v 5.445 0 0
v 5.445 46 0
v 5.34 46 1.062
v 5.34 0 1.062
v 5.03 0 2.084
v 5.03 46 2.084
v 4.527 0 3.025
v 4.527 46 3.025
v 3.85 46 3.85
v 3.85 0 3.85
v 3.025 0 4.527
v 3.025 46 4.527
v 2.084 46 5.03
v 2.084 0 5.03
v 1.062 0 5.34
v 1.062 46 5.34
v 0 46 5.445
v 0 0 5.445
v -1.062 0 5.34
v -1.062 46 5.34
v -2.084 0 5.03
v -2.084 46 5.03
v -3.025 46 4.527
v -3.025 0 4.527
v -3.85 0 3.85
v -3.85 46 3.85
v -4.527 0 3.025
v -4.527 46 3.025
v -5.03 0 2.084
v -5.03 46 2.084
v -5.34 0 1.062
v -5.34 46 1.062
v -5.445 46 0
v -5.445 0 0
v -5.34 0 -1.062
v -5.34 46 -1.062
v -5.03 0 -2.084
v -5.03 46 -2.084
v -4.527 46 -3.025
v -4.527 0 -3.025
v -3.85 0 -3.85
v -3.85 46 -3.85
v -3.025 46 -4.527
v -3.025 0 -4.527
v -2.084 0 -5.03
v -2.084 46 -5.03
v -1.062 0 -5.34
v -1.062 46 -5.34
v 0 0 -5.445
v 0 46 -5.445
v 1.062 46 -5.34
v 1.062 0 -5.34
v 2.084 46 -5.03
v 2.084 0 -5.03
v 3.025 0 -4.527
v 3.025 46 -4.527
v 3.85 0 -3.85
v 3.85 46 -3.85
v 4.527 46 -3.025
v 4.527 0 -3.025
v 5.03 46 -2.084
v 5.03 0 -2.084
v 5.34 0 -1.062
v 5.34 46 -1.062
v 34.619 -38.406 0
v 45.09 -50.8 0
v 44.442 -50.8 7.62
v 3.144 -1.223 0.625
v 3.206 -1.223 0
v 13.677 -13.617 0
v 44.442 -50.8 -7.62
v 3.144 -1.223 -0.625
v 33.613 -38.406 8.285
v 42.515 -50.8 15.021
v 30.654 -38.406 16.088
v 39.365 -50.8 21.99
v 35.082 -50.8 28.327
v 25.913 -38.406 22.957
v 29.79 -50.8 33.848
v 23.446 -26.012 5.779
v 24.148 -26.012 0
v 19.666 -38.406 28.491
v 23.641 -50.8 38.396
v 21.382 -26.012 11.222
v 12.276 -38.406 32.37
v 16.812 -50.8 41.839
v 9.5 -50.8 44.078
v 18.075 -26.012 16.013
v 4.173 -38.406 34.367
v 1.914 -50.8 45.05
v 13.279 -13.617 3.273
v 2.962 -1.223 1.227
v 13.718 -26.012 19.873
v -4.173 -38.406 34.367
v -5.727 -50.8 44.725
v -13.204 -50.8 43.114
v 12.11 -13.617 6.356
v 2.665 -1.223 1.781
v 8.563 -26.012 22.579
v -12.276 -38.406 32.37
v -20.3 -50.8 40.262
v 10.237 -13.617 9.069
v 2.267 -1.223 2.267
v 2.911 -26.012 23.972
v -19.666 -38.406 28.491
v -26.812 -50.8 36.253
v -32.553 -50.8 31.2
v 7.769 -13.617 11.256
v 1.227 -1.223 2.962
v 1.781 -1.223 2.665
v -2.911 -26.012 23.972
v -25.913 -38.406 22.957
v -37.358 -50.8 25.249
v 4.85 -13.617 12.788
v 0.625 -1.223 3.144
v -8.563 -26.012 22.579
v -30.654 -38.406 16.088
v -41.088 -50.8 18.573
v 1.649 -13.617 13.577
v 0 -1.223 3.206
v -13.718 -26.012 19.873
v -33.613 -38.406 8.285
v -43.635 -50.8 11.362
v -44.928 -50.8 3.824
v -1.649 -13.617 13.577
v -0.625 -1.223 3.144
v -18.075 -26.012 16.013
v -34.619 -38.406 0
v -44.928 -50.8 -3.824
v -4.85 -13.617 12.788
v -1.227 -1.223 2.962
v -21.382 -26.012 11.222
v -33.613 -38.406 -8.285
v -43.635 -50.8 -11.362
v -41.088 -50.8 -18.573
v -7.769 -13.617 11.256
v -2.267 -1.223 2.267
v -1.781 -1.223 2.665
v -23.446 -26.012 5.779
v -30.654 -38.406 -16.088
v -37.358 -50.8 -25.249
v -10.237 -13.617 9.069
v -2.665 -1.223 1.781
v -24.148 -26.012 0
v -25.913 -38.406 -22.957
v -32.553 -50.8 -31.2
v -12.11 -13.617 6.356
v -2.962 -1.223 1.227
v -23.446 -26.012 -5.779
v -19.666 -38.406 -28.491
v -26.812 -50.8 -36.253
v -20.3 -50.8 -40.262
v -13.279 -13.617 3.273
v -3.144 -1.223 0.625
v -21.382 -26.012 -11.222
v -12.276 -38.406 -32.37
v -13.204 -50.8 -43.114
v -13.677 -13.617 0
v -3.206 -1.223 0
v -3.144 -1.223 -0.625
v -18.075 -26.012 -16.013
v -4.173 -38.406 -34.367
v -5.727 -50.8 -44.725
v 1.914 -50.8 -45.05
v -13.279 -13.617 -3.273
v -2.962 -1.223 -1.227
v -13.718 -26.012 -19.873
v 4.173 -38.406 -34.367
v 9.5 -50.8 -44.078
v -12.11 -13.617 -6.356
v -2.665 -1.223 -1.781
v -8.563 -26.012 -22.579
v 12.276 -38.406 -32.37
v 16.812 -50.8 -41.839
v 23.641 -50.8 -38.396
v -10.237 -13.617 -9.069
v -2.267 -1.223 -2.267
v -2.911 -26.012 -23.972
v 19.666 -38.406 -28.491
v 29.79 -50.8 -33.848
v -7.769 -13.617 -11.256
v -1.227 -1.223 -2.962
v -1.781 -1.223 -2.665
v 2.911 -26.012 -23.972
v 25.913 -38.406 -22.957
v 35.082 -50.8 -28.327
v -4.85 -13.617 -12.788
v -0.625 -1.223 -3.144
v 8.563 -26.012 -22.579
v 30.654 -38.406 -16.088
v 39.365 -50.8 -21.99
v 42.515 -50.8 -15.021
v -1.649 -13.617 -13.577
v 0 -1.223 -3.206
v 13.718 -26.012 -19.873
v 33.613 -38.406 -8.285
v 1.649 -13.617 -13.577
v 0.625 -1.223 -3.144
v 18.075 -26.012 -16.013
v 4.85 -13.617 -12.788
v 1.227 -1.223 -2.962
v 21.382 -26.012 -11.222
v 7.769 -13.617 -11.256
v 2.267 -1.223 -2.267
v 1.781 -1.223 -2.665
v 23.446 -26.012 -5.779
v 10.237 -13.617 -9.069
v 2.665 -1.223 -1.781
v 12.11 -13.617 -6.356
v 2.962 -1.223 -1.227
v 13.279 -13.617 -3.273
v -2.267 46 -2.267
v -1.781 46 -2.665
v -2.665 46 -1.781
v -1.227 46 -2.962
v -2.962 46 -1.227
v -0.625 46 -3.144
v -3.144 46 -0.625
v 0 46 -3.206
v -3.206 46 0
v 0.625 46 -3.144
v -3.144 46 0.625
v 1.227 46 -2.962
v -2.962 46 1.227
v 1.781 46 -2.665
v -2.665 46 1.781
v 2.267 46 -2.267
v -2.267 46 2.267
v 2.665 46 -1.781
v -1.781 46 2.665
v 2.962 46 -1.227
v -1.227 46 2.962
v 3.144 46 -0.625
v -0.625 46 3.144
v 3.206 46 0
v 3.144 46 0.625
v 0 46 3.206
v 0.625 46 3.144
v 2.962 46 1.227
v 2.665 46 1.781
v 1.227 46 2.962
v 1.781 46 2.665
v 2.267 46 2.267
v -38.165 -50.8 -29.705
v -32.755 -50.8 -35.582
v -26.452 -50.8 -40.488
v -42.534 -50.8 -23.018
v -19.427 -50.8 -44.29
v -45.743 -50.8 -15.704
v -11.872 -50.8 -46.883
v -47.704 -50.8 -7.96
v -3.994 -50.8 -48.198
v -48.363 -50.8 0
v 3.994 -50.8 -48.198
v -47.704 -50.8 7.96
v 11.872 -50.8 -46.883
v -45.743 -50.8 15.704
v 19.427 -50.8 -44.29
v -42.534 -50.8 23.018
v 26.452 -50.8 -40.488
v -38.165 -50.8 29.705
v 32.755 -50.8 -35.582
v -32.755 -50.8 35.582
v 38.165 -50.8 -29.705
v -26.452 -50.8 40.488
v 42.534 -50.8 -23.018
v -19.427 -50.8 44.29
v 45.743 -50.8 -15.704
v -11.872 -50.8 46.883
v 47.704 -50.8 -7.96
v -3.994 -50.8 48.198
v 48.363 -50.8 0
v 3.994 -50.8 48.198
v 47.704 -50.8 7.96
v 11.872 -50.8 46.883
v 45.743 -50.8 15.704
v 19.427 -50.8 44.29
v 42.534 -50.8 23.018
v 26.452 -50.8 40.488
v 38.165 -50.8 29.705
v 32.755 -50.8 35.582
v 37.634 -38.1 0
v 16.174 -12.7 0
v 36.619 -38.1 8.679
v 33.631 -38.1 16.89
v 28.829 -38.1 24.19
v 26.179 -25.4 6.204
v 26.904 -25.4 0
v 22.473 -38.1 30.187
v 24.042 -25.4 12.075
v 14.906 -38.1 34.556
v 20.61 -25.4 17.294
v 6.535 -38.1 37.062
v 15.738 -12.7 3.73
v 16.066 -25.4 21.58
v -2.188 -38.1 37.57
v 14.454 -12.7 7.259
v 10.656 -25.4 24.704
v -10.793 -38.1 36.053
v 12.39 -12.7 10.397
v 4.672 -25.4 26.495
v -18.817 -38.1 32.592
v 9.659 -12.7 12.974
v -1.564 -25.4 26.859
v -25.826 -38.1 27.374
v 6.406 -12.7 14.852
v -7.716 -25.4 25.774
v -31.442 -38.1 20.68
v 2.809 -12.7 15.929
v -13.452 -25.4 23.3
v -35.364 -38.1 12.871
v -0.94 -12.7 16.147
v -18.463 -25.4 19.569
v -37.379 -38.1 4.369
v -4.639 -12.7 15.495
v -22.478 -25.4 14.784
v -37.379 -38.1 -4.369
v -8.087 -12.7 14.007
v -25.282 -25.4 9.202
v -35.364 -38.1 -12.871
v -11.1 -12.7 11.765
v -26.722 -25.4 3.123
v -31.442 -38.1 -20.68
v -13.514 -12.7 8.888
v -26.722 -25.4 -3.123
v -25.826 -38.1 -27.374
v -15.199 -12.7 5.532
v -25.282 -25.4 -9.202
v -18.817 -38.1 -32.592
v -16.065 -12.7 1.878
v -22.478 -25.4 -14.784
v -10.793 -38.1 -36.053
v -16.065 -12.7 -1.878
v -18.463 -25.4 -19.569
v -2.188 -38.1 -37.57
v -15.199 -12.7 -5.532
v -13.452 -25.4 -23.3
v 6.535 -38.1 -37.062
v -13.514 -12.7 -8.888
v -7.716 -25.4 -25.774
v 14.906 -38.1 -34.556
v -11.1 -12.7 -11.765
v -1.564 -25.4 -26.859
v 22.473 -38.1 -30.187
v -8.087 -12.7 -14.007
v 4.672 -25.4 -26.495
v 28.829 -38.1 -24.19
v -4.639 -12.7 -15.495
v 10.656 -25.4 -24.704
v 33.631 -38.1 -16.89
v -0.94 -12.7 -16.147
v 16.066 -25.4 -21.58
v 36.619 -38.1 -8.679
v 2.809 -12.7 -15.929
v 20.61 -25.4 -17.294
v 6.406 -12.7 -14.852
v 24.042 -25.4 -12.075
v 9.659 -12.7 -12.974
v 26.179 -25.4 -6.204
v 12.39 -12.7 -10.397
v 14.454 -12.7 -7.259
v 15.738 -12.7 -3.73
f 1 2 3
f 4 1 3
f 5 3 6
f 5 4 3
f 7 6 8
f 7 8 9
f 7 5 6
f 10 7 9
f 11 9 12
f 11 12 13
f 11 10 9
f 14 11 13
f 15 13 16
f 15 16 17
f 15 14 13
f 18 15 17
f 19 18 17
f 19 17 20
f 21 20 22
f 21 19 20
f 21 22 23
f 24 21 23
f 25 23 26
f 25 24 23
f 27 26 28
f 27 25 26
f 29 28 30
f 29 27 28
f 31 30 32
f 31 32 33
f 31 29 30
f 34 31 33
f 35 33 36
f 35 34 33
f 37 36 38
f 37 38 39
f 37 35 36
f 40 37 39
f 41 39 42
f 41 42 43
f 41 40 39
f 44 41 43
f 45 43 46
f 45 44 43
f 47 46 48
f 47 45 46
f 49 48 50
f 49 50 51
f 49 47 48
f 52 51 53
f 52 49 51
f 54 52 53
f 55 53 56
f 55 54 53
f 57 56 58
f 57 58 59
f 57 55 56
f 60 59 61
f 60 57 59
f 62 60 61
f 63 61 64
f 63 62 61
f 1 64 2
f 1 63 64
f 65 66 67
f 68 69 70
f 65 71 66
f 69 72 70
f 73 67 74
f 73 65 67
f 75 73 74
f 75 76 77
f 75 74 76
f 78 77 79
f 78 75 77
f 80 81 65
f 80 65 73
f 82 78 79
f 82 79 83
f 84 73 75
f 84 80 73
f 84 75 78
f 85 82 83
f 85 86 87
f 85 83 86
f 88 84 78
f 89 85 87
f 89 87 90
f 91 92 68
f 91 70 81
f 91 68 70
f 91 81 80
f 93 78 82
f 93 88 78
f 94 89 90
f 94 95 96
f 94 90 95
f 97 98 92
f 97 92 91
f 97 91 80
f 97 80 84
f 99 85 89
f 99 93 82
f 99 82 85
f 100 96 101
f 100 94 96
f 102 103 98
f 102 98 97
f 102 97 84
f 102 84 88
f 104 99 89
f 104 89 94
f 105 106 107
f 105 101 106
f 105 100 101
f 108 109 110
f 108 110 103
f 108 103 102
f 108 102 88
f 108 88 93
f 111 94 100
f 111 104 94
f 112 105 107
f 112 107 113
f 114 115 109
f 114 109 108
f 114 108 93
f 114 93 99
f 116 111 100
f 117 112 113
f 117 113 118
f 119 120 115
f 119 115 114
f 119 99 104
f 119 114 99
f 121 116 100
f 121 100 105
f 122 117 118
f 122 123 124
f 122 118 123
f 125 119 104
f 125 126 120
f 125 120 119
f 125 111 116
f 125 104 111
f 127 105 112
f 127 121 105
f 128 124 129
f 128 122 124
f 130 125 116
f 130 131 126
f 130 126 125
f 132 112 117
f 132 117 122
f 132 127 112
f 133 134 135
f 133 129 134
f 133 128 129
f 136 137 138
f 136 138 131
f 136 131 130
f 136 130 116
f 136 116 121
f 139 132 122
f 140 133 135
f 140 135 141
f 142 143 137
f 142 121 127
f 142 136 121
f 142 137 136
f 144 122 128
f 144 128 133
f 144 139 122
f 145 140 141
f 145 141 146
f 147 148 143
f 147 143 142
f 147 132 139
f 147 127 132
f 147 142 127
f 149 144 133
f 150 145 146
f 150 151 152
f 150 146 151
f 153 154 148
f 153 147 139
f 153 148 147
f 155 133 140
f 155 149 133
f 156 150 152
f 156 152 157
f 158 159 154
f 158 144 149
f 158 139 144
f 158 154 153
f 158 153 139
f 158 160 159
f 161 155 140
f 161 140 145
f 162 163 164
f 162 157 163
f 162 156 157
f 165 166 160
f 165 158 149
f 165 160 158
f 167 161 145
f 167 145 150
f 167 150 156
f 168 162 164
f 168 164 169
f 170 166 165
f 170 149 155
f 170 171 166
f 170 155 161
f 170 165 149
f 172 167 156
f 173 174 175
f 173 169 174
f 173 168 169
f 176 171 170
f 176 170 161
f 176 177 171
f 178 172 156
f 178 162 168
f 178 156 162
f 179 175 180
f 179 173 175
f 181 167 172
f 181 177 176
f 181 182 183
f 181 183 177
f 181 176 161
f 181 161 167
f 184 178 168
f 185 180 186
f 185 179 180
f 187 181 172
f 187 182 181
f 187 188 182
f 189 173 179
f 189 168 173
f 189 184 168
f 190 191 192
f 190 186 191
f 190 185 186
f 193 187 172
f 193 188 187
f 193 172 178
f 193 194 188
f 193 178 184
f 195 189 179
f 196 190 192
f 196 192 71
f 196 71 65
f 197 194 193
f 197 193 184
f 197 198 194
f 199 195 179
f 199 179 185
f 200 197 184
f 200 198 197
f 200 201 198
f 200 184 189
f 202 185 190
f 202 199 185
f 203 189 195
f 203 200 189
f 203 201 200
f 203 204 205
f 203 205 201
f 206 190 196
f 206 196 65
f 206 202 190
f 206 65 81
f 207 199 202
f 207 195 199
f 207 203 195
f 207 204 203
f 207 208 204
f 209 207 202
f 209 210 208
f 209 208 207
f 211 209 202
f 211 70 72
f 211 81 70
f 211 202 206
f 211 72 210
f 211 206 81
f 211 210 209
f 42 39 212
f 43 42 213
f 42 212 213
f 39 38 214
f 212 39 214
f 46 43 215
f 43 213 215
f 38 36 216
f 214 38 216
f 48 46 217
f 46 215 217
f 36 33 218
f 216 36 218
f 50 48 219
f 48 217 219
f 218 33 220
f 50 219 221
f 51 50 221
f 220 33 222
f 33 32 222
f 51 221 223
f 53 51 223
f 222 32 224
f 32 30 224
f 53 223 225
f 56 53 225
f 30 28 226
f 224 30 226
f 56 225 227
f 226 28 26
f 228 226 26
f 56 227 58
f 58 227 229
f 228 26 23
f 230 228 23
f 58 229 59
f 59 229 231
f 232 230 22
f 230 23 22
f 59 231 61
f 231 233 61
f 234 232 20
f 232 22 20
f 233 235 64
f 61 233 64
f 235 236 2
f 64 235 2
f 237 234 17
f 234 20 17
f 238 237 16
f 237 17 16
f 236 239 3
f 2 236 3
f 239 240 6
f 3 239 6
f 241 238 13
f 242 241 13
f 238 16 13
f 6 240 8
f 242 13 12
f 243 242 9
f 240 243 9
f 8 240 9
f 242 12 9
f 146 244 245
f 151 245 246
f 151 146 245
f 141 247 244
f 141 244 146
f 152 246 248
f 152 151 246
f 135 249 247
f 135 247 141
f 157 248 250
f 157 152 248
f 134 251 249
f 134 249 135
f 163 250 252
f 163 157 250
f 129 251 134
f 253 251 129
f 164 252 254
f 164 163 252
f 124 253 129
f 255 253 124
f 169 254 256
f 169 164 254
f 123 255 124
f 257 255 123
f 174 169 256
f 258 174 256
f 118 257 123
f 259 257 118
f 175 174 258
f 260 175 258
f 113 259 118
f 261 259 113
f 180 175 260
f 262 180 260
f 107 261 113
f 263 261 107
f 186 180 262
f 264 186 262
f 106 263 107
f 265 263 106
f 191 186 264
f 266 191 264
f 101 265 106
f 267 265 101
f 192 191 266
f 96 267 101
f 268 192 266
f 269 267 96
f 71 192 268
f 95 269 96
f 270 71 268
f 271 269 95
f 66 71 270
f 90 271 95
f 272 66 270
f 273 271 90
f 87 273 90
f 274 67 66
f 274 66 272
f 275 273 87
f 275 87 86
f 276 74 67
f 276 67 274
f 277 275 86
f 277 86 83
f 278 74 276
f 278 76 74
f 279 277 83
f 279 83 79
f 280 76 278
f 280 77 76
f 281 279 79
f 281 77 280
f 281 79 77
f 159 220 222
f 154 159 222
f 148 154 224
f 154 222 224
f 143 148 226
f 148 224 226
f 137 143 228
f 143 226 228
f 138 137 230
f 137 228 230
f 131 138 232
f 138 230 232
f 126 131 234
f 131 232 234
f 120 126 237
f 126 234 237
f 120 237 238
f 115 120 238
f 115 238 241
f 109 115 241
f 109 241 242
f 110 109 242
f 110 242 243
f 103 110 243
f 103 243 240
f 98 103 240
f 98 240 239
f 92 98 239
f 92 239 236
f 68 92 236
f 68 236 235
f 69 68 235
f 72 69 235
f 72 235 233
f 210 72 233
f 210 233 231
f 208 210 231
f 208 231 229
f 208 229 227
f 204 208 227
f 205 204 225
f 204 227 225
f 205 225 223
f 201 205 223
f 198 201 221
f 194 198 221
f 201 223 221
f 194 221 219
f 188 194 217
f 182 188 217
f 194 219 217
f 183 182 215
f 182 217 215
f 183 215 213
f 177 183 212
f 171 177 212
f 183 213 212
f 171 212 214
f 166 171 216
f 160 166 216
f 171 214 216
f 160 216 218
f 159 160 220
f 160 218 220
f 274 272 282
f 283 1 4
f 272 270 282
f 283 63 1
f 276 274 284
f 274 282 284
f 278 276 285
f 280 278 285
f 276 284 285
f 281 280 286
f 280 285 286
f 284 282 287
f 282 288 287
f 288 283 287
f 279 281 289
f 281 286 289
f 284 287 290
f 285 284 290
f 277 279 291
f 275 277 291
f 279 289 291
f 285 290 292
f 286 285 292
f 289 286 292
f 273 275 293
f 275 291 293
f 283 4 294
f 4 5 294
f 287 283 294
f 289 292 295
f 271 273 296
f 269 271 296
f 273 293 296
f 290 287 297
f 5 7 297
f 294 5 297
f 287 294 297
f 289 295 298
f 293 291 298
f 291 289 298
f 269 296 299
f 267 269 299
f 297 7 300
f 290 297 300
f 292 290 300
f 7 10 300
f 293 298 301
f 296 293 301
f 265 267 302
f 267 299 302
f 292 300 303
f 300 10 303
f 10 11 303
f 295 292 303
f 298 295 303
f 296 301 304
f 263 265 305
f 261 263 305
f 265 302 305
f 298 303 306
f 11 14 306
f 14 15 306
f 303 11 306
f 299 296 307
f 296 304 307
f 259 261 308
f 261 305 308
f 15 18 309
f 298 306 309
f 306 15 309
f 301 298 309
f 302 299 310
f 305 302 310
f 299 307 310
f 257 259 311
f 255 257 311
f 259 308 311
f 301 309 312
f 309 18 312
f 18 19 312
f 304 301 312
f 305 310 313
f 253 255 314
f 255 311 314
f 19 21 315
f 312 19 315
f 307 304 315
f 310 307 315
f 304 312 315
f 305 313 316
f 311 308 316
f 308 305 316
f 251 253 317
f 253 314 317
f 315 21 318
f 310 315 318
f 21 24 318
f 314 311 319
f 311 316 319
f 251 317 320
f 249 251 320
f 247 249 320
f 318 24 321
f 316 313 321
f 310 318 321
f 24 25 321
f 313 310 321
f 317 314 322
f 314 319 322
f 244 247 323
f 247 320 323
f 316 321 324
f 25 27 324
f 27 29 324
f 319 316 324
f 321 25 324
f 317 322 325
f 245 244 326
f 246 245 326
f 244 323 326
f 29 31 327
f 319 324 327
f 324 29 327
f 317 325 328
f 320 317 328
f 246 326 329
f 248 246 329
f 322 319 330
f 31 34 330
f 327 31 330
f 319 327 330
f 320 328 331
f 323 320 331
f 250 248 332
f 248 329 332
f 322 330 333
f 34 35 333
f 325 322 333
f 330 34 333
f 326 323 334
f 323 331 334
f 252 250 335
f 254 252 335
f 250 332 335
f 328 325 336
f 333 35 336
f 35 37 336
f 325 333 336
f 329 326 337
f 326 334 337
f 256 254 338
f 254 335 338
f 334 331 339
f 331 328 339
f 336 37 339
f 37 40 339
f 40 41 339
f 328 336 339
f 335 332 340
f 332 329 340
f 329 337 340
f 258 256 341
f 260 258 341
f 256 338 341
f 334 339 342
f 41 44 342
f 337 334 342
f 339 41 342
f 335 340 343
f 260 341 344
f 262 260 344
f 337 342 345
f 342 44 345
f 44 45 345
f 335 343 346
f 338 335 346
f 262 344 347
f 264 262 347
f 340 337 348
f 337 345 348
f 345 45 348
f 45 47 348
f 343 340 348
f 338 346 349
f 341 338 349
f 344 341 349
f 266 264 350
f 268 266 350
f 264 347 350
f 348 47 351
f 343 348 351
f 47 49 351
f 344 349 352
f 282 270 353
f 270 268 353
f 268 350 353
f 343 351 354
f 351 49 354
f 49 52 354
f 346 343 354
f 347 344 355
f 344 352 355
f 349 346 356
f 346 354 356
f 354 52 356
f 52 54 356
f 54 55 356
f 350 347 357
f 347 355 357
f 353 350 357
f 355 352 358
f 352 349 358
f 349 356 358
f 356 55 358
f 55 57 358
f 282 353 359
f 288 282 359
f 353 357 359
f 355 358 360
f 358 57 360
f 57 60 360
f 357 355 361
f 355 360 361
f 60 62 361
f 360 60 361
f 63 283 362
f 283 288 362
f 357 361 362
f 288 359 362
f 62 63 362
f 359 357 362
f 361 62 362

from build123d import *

# Parameters (mm, degrees)
F0_R      = 5.4448713035
F1_DEPTH  = 46
F3_R      = 48.3631906875
F1_FACE_R = 5.4448713035
F5_T      = -2.5
F6_R      = 3.2055252898
F7_DEPTH  = 96.8010001


with BuildPart() as f1:
    # F0 (on Front) → F1 (new body)
    with BuildSketch(Plane.XZ):
        Circle(F0_R)
    extrude(amount=-F1_DEPTH)

    # F3 (on offset) → F4 section 0
    with BuildSketch(Plane.XZ.offset(50.8)):
        Circle(F3_R)
    # F1_face (on face) → F4 section 1
    with BuildSketch(Plane.XZ):
        Circle(F1_FACE_R)
    loft()

    # F5
    f5_openings = [f1.faces().sort_by_distance(p)[0] for p in [
        (0, -50.8, 0),
    ]]
    offset(amount=F5_T, openings=f5_openings, kind=Kind.INTERSECTION)

    # F6 (on face) → F7 (cut, through all)
    with BuildSketch(Plane(origin=(0, 46, 0), x_dir=(-1, 0, 0), z_dir=(0, 1, 0))):
        Circle(F6_R)
    extrude(amount=-F7_DEPTH, mode=Mode.SUBTRACT)


solid = f1.part
